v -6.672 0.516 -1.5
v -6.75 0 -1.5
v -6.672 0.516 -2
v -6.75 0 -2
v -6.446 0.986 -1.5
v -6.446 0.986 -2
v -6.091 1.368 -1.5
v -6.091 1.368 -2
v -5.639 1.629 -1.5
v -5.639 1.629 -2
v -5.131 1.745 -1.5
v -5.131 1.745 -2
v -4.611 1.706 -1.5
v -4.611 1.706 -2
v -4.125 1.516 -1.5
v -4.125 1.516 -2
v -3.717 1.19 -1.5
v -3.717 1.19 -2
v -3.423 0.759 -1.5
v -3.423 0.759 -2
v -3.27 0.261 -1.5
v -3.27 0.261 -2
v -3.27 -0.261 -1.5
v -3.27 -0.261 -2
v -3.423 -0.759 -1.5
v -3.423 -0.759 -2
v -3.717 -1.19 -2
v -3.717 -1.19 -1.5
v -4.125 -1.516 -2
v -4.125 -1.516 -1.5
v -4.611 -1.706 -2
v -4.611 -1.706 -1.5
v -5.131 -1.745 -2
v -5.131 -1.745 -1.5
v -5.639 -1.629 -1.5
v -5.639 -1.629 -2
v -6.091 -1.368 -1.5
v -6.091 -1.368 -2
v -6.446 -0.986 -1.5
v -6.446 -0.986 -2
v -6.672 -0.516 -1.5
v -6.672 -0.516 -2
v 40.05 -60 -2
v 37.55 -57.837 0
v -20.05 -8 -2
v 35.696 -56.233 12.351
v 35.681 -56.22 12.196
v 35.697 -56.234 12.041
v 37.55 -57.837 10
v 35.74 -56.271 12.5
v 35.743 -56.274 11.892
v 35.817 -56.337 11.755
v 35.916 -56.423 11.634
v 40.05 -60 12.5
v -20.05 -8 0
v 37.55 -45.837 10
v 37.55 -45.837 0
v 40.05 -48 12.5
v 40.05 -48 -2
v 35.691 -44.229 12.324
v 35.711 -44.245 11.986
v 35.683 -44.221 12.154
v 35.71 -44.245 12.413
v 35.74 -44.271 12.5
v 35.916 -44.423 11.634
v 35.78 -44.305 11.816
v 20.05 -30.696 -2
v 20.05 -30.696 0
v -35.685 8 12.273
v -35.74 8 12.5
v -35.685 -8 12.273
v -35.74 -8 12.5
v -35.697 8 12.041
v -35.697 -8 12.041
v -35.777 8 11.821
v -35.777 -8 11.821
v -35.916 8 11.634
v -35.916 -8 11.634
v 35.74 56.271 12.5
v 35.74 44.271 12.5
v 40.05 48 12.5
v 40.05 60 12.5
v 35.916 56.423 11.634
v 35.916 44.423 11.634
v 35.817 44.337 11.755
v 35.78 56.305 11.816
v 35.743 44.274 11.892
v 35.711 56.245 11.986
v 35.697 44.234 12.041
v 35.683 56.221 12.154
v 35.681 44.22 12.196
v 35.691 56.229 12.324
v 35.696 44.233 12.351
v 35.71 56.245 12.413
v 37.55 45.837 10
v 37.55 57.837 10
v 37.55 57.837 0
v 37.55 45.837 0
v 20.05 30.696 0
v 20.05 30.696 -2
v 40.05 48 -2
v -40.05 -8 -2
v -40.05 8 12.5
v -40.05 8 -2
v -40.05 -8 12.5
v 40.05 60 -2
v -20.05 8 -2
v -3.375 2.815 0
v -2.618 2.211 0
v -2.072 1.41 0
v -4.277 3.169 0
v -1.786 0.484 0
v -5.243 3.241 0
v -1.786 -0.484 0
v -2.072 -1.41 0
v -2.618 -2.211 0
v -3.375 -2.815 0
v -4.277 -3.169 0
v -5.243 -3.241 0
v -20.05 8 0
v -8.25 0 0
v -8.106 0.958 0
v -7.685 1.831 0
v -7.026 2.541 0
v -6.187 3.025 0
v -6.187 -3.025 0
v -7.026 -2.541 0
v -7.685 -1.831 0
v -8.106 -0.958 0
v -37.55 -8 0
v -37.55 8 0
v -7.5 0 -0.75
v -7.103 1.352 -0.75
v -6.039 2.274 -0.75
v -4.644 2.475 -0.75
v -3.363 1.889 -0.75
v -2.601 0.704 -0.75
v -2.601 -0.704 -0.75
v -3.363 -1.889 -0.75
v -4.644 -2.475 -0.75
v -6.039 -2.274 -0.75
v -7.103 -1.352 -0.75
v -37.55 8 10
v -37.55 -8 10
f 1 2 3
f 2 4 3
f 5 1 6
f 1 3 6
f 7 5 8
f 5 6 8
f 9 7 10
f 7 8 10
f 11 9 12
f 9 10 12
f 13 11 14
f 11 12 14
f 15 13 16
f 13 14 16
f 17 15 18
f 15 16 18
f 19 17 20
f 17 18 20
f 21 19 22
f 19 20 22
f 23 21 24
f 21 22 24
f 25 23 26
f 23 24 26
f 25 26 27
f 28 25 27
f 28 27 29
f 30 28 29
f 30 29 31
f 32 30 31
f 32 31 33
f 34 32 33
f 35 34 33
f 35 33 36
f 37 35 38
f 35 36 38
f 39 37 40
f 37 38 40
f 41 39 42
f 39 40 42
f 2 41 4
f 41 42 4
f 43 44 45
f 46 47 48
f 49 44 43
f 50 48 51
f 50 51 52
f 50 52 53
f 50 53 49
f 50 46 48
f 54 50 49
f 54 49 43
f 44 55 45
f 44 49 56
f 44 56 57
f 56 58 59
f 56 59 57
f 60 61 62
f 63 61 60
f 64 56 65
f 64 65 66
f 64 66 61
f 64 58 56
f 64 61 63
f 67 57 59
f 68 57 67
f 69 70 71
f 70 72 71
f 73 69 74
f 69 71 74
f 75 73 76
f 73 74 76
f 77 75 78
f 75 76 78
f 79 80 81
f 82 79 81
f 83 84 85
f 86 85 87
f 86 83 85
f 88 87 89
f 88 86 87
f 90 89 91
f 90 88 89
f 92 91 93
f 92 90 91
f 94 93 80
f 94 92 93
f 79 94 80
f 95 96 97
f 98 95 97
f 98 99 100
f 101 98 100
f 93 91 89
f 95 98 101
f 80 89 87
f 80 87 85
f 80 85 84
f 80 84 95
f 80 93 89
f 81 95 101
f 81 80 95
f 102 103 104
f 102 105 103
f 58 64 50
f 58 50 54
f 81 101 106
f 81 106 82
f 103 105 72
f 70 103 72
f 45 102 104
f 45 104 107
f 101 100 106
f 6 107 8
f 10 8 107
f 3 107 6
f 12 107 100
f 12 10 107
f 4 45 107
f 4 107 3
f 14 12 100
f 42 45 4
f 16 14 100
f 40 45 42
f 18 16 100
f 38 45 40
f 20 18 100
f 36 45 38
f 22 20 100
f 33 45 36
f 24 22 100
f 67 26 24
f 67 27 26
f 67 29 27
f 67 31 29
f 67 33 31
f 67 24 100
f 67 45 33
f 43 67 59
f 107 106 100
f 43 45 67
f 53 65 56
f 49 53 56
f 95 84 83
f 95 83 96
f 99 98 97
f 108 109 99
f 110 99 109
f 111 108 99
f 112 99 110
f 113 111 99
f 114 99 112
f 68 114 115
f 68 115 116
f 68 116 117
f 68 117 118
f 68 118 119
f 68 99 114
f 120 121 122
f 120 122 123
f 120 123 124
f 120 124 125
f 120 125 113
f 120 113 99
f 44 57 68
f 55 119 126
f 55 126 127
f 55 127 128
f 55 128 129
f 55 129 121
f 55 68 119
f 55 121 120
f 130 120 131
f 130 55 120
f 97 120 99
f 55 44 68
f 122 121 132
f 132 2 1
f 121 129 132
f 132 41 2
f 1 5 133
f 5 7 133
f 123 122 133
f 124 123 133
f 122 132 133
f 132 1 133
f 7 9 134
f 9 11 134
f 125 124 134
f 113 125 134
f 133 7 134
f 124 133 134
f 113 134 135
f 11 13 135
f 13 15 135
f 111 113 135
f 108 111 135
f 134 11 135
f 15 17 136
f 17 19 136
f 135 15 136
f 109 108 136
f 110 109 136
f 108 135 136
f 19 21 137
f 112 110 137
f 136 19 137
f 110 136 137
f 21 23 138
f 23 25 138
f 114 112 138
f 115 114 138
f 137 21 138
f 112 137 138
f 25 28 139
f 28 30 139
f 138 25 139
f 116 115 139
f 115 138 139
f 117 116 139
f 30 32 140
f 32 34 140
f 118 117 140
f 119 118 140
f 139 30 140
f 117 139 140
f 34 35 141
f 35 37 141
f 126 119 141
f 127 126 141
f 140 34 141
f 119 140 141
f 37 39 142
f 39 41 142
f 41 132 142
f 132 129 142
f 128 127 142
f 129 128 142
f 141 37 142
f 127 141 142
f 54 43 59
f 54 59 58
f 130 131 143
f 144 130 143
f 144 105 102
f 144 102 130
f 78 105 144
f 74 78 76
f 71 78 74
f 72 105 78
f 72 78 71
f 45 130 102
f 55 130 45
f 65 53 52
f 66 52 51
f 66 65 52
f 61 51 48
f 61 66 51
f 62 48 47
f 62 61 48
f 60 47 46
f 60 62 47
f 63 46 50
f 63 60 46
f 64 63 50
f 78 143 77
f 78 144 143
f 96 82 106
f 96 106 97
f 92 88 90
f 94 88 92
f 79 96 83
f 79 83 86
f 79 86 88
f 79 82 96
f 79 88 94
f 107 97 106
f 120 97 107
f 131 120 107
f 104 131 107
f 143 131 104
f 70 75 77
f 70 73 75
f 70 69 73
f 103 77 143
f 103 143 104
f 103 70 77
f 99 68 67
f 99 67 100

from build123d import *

# Parameters (mm, degrees)
F1_DEPTH       = 60
F2_R           = 0.8
F4_DEPTH       = 12.5
F6_D           = 3.5
F6_CSINK_D     = 6.5
F6_CSINK_ANGLE = 90


with BuildPart() as f1:
    # F0 (on Front) → F1 (new body, symmetric)
    with BuildSketch(Plane.XZ):
        Polygon((37.55, 0), (0, 0), (-37.55, 0), (-37.55, 10), (-34.55, 13), (-40.05, 13), (-40.05, -2), (0, -2), (40.05, -2), (40.05, 13), (34.55, 13), (37.55, 10), align=None)
    extrude(amount=F1_DEPTH, both=True)

    # F2
    f2_edges = [f1.edges().sort_by_distance(p)[0] for p in [
        (-34.55, 0, 13),
        (34.55, 0, 13),
    ]]
    fillet(f2_edges, radius=F2_R)

    # F3 (on face) → F4 (intersect, symmetric)
    with BuildSketch(Plane.XY):
        Polygon((-20.05, -8), (40.05, -60), (40.05, -48), (20.05, -30.695507), (20.05, 0), (20.05, 30.695507), (40.05, 48), (40.05, 60), (-20.05, 8), (-40.05, 8), (-40.05, 0), (-40.05, -8), align=None)
    extrude(amount=F4_DEPTH, both=True, mode=Mode.INTERSECT)

    # F6 (through all)
    with Locations(Plane.XY):
        with Locations((-5, 0)):
            CounterSinkHole(F6_D / 2, F6_CSINK_D / 2, counter_sink_angle=F6_CSINK_ANGLE)


solid = f1.part
